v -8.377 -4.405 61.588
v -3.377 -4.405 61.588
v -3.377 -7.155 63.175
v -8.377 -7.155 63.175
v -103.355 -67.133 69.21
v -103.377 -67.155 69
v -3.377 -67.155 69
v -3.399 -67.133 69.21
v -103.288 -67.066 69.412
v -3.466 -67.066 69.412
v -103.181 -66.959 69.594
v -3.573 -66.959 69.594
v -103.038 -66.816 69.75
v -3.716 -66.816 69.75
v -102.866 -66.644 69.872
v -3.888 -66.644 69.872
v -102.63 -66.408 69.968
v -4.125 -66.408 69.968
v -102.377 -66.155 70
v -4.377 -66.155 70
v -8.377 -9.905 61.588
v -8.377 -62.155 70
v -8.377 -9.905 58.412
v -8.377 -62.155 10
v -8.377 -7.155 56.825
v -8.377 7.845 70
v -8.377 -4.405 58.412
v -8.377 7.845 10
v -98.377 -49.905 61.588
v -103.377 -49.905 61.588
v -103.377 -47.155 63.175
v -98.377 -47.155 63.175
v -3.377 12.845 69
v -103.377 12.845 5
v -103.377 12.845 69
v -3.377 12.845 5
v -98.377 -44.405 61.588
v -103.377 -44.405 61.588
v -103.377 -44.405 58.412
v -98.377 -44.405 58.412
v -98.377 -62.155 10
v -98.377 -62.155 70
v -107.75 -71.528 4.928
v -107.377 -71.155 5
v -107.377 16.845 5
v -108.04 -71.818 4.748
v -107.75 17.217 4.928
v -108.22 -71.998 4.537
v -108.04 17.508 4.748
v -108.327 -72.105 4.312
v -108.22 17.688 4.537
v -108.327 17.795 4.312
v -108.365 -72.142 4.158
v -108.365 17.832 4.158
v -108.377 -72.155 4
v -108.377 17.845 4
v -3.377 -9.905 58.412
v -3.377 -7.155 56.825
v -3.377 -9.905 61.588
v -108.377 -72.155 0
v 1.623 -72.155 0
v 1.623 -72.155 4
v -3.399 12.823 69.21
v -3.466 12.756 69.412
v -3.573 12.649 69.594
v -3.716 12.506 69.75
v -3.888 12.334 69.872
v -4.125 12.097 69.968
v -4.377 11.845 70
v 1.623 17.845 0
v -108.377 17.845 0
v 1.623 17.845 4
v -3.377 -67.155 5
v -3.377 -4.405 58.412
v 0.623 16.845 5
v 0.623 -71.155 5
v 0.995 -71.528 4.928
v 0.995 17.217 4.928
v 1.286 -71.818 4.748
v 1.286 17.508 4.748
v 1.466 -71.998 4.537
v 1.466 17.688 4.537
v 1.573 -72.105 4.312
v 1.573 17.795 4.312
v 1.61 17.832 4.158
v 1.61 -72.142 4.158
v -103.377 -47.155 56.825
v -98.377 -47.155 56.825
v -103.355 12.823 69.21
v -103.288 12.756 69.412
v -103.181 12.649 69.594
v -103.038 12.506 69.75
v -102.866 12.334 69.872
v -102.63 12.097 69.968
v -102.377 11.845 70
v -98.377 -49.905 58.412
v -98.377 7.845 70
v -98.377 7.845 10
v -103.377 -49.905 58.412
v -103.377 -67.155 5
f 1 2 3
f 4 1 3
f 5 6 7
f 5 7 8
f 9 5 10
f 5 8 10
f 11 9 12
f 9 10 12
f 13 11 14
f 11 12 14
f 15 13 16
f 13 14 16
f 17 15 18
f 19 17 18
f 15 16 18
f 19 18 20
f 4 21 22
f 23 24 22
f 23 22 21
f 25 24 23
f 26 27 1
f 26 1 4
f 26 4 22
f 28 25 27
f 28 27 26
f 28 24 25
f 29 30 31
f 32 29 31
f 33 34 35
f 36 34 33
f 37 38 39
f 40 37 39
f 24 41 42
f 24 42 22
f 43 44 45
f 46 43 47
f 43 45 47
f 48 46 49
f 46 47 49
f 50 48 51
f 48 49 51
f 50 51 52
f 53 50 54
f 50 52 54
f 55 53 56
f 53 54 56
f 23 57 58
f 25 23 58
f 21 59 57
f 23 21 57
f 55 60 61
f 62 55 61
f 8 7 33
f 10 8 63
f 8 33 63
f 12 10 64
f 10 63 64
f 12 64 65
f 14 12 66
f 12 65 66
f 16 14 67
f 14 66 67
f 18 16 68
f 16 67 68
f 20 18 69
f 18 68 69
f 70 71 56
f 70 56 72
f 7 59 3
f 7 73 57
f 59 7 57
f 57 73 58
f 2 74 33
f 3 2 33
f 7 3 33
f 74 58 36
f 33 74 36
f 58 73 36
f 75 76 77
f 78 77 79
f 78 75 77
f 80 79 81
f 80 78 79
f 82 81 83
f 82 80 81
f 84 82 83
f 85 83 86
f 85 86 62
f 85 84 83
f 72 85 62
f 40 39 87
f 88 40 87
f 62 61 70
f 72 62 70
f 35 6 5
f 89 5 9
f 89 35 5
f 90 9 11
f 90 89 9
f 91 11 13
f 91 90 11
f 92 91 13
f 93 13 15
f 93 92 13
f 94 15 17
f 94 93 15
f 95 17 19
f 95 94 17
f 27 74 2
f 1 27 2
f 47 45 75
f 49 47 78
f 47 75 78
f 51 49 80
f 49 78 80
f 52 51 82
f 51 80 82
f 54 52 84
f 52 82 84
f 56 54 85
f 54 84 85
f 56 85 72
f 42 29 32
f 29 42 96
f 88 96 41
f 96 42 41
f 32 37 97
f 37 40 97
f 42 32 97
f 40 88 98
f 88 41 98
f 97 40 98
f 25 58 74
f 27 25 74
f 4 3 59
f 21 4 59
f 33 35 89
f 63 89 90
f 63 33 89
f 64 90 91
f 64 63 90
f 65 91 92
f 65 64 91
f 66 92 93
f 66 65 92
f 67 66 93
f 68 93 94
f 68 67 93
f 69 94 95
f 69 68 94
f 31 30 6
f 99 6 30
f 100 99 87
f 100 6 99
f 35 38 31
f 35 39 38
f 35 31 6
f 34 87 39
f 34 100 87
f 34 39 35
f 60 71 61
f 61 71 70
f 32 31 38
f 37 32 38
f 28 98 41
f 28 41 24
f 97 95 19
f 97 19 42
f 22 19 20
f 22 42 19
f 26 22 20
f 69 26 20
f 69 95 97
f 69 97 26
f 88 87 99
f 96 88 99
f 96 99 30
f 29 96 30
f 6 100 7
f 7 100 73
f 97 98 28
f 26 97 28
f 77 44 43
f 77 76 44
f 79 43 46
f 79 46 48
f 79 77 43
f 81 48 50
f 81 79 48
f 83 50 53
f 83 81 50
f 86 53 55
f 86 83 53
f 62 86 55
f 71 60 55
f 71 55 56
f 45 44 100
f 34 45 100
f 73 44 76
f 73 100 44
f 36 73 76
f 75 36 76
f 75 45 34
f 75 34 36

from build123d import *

# Parameters (mm, degrees)
ESQUISSE1_W             = 110
ESQUISSE1_H             = 90
ESQUISSE1_W_2           = 100
ESQUISSE1_H_2           = 80
BOSS_EXTRU_1_DEPTH      = 5
ESQUISSE1_32_W          = 100
ESQUISSE1_32_H          = 80
ESQUISSE1_32_W_2        = 90
ESQUISSE1_32_H_2        = 70
BOSS_EXTRU_2_DEPTH      = 70
ESQUISSE1_33_W          = 90
ESQUISSE1_33_H          = 70
BOSS_EXTRU_3_DEPTH      = 10
ENL_V_MAT_EXTRU_3_DEPTH = 10
ENL_V_MAT_EXTRU_4_DEPTH = 10
CONG_1_R                = 1
CONG_2_R                = 1


with BuildPart() as part:
    # Esquisse1 → Boss.-Extru.1 (new body)
    with BuildSketch(Plane.XY):
        with Locations((-53.377032771, -27.155018472)):
            Rectangle(ESQUISSE1_W, ESQUISSE1_H)
        with Locations((-53.377032771, -27.155018472)):
            Rectangle(ESQUISSE1_W_2, ESQUISSE1_H_2, mode=Mode.SUBTRACT)
    extrude(amount=BOSS_EXTRU_1_DEPTH)

    # Esquisse1<32> → Boss.-Extru.2 (add)
    with BuildSketch(Plane.XY):
        with Locations((-53.377032771, -27.155018472)):
            Rectangle(ESQUISSE1_32_W, ESQUISSE1_32_H)
        with Locations((-53.377032771, -27.155018472)):
            Rectangle(ESQUISSE1_32_W_2, ESQUISSE1_32_H_2, mode=Mode.SUBTRACT)
    extrude(amount=BOSS_EXTRU_2_DEPTH)

    # Esquisse1<33> → Boss.-Extru.3 (add)
    with BuildSketch(Plane.XY):
        with Locations((-53.377032771, -27.155018472)):
            Rectangle(ESQUISSE1_33_W, ESQUISSE1_33_H)
    extrude(amount=BOSS_EXTRU_3_DEPTH)

    # Esquisse11 → Enlèv. mat.-Extru.3 (cut)
    with BuildSketch(Plane(origin=(-3.377032771, 0, 0), x_dir=(0, 0, -1), z_dir=(1, 0, 0))):
        Polygon((-56.824573519, -7.155018472), (-58.41228676, -4.405018472), (-61.58771324, -4.405018472), (-63.175426481, -7.155018472), (-61.58771324, -9.905018472), (-58.41228676, -9.905018472), align=None)
    extrude(amount=-ENL_V_MAT_EXTRU_3_DEPTH, mode=Mode.SUBTRACT)

    # Esquisse13 → Enlèv. mat.-Extru.4 (cut)
    with BuildSketch(Plane.ZY.offset(103.377032771)):
        Polygon((63.175426481, -47.155018472), (61.58771324, -44.405018472), (58.41228676, -44.405018472), (56.824573519, -47.155018472), (58.41228676, -49.905018472), (61.58771324, -49.905018472), align=None)
    extrude(amount=-ENL_V_MAT_EXTRU_4_DEPTH, mode=Mode.SUBTRACT)

    # Congé1
    cong_1_edges = [part.edges().sort_by_distance(p)[0] for p in [
        (-53.377032771, 12.844981528, 70),
        (-103.377032771, -27.155018472, 70),
        (-53.377032771, -67.155018472, 70),
        (-3.377032771, -27.155018472, 70),
    ]]
    fillet(cong_1_edges, radius=CONG_1_R)

    # Congé2
    cong_2_edges = [part.edges().sort_by_distance(p)[0] for p in [
        (-53.377032771, -72.155018472, 5),
        (1.622967229, -27.155018472, 5),
        (-53.377032771, 17.844981528, 5),
        (-108.377032771, -27.155018472, 5),
    ]]
    fillet(cong_2_edges, radius=CONG_2_R)


solid = part.part
